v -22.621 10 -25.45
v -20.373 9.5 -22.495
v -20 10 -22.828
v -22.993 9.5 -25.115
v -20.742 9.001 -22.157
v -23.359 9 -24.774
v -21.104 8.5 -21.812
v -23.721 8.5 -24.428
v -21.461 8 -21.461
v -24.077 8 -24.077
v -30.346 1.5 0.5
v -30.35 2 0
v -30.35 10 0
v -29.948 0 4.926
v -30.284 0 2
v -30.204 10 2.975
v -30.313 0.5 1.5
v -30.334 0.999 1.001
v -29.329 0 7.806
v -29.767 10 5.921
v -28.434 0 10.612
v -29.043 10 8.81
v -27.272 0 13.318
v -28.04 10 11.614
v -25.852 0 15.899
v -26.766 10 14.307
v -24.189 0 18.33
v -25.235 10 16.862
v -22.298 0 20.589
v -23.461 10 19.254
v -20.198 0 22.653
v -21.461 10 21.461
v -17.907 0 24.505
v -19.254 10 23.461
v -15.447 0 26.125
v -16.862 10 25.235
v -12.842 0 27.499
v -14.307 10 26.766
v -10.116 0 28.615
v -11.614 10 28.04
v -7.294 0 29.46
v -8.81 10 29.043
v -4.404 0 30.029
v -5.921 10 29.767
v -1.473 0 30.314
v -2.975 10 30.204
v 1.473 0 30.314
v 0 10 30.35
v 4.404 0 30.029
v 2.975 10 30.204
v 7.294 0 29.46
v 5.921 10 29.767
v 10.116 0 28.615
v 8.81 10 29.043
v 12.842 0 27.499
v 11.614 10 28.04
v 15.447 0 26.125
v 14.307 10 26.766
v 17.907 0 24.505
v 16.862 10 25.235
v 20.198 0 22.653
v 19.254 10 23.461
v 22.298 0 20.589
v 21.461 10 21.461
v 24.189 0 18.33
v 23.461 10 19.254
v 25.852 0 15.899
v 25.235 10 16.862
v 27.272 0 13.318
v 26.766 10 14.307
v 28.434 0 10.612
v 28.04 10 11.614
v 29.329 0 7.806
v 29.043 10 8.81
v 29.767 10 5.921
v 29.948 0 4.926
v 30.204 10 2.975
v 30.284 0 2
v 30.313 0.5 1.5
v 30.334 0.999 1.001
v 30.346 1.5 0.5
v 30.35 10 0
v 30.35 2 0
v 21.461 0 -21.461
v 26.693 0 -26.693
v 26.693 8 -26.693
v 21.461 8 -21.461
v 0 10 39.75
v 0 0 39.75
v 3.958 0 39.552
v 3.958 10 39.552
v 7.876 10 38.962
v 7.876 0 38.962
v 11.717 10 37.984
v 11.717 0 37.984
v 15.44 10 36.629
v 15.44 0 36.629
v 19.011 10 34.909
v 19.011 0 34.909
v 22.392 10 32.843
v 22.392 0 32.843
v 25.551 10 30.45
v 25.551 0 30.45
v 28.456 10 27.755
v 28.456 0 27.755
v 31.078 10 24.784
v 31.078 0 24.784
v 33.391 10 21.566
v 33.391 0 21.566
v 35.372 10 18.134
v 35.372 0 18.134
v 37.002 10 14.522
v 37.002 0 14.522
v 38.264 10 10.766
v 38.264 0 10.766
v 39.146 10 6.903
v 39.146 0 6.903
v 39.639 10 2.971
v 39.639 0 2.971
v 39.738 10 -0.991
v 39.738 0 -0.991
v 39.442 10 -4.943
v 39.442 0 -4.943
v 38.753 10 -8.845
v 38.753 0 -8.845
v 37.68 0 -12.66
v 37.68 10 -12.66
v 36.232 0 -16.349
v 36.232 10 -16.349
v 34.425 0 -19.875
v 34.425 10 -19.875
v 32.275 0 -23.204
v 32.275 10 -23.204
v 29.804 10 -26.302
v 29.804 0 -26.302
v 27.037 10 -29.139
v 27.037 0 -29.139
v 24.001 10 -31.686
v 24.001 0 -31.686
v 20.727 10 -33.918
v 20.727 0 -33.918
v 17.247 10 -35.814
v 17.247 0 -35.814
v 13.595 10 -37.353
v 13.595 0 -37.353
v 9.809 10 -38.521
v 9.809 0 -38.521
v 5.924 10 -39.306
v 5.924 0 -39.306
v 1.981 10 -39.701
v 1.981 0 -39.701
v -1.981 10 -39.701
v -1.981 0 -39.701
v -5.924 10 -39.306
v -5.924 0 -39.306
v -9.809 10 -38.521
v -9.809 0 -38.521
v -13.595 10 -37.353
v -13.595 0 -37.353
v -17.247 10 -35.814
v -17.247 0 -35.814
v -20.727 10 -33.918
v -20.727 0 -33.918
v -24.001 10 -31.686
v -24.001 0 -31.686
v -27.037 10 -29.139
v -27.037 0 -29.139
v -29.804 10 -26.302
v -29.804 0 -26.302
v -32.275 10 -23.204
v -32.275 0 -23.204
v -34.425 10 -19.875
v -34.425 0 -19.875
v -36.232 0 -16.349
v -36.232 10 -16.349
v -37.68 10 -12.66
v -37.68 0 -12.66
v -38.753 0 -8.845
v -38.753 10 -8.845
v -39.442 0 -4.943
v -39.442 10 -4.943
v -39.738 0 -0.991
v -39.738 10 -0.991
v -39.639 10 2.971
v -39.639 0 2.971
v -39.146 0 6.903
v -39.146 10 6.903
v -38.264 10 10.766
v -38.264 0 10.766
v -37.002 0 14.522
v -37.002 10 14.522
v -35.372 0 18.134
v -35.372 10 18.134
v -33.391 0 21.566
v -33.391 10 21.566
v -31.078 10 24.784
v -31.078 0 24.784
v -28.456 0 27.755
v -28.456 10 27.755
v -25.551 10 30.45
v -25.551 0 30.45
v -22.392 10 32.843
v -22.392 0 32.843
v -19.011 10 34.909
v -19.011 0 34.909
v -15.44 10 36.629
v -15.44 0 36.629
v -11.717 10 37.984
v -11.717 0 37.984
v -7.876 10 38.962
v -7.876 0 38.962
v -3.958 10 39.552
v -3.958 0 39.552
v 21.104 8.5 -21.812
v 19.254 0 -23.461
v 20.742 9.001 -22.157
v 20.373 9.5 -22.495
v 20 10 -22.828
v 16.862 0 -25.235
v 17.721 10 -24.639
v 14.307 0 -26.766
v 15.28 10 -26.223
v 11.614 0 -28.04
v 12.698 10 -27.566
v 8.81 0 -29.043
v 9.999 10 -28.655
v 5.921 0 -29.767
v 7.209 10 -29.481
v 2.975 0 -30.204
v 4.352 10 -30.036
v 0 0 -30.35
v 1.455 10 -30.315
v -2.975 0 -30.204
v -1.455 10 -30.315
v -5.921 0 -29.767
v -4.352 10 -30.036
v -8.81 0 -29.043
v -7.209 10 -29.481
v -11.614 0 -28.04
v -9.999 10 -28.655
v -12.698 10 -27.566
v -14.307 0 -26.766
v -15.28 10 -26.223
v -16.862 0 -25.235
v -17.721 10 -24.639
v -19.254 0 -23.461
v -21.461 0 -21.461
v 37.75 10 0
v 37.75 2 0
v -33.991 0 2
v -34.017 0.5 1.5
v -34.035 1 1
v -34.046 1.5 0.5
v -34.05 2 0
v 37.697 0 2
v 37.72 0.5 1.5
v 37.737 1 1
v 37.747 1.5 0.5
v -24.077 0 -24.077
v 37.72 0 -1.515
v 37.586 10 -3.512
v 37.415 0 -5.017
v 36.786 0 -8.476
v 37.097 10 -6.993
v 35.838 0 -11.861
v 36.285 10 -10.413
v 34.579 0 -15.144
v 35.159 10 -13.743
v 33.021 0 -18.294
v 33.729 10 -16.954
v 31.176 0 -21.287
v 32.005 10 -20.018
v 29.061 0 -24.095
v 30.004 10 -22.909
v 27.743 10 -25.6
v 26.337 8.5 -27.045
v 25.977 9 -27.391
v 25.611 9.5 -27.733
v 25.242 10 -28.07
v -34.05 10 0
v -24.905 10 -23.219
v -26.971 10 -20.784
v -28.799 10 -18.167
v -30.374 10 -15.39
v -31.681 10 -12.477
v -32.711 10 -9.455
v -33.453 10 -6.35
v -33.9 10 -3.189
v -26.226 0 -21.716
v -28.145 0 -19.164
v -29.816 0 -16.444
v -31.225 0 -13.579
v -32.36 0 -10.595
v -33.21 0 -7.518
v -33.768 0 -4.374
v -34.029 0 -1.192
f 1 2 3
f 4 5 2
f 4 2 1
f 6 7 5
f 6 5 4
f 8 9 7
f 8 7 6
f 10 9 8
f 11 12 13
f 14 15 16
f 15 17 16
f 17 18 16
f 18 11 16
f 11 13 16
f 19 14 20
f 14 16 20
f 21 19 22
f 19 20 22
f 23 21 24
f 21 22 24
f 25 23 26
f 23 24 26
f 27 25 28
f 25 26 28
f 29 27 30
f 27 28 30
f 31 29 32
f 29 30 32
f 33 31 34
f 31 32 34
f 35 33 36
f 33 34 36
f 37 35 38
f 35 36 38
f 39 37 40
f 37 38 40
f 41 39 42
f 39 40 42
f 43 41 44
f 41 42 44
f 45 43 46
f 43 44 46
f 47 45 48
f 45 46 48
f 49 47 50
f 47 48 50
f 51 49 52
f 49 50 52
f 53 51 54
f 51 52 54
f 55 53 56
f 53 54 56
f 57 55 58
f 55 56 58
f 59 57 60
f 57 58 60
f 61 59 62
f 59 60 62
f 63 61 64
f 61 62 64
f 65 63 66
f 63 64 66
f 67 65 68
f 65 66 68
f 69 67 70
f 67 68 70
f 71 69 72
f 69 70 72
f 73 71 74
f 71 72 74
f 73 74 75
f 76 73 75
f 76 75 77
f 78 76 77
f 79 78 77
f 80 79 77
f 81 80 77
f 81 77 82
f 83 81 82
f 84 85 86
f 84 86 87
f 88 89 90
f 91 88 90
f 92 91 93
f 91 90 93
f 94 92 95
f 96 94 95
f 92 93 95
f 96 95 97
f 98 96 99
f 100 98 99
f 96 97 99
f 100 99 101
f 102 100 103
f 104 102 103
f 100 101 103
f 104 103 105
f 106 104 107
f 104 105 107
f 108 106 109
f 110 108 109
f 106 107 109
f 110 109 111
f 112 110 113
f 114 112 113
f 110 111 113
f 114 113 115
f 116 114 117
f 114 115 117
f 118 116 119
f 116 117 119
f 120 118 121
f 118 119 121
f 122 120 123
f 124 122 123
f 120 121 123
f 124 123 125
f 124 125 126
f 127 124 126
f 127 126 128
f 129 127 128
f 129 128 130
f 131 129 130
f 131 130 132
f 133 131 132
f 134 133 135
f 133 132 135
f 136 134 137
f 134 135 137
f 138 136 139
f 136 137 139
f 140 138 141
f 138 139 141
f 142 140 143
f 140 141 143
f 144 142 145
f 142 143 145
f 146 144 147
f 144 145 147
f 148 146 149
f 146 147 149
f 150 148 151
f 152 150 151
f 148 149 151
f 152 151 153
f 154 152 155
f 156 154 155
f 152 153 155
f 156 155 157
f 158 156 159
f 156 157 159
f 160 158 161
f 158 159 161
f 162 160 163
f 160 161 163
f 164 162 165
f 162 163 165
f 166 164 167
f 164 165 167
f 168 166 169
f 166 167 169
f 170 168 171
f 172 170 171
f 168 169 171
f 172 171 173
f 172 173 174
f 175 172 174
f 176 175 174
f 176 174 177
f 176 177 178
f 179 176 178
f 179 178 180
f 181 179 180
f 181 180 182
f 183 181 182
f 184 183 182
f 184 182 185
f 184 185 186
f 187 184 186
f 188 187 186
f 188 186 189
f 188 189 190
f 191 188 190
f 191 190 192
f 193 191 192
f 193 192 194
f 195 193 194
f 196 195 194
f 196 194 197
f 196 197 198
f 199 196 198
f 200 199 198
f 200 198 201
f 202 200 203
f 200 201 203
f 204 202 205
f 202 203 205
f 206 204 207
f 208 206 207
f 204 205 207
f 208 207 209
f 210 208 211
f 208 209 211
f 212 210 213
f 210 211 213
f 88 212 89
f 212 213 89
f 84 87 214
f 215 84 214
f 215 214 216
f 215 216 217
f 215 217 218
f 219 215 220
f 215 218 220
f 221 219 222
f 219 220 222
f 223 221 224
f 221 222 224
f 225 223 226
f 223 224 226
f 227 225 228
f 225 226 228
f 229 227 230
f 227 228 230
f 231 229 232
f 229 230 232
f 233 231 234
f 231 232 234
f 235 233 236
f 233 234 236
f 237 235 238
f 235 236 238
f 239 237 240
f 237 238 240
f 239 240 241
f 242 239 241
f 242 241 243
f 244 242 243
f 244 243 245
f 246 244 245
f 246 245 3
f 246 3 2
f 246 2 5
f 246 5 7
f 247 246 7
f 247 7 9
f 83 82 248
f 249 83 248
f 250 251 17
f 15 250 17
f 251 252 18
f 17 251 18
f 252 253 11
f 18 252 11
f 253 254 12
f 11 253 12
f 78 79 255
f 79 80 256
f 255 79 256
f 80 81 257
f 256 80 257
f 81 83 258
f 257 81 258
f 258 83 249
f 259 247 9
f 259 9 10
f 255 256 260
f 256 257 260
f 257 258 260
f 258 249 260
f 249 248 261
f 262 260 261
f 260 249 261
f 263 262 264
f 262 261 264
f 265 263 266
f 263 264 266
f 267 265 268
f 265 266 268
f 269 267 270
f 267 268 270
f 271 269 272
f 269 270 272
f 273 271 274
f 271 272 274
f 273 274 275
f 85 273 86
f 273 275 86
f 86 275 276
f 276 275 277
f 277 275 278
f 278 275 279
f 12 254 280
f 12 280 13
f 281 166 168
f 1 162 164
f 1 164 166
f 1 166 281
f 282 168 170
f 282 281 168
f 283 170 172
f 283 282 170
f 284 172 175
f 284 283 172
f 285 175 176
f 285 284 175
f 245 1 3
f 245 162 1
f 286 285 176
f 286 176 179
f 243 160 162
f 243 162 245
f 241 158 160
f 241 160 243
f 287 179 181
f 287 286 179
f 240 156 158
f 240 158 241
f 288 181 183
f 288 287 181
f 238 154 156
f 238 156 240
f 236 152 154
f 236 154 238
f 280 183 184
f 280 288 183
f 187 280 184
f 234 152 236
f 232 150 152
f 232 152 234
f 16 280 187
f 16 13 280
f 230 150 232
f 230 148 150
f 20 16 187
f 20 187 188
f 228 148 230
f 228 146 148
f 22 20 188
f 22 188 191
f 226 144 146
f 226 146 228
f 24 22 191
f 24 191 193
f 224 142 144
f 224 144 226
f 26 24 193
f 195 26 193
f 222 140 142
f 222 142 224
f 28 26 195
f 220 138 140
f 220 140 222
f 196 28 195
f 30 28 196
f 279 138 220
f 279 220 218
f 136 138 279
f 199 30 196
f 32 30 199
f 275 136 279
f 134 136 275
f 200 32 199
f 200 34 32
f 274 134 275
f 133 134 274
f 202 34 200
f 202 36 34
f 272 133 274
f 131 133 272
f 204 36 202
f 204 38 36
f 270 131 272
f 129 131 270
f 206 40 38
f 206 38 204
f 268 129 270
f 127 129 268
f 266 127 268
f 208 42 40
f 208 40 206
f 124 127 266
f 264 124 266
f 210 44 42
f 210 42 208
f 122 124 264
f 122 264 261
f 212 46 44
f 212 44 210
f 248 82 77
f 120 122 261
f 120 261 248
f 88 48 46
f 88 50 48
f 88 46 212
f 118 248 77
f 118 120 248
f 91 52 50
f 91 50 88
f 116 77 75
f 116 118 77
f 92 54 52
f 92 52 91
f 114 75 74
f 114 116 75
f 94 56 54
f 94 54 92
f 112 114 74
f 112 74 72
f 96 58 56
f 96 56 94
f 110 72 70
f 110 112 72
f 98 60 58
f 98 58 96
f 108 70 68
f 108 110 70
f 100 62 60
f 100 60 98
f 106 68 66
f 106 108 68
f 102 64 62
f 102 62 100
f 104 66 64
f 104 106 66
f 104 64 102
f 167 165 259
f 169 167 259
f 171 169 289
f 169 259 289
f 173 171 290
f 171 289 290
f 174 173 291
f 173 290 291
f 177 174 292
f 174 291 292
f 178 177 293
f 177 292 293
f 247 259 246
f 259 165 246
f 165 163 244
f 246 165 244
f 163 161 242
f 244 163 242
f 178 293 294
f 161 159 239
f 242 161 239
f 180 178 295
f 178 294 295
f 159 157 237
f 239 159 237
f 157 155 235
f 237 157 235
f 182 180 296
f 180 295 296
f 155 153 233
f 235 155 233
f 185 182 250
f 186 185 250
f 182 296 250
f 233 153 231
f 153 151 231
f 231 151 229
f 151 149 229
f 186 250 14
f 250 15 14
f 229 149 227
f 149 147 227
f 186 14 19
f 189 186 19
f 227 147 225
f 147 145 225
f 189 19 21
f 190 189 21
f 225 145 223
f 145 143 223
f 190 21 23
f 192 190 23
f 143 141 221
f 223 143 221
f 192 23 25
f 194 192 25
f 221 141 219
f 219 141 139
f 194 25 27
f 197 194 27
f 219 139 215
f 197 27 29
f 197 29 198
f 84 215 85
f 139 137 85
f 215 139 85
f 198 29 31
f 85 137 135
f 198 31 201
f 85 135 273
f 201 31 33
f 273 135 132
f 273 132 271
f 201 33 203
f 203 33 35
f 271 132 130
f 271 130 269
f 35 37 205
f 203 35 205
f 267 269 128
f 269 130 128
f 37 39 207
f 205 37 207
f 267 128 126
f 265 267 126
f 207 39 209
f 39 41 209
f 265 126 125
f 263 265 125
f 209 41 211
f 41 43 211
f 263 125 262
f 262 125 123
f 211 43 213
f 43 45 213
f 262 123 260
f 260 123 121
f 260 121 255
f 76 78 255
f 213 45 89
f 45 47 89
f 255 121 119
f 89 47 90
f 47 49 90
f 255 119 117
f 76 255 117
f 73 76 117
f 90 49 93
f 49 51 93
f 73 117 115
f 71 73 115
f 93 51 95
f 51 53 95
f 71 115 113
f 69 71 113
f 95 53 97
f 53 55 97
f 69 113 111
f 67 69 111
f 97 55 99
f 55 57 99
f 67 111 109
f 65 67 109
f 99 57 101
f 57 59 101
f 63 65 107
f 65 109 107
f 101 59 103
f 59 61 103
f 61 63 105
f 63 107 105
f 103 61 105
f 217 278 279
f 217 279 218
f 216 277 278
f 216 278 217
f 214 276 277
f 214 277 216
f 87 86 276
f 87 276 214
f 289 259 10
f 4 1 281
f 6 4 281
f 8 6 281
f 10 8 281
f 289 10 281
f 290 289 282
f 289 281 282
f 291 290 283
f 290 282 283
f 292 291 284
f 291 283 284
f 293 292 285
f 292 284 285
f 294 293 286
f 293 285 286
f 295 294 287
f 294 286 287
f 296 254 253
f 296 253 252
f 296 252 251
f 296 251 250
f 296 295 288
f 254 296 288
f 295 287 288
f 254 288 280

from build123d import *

# Parameters (mm, degrees)
SKETCH1_R           = 39.75
BOSS_EXTRUDE1_DEPTH = 10
CUT_EXTRUDE4_DEPTH  = 10
CHAMFER1_SIZE       = 2
CHAMFER2_SIZE       = 2
CHAMFER3_SIZE       = 2
CHAMFER4_SIZE       = 2


with BuildPart() as part:
    # Sketch1 → Boss-Extrude1 (new body)
    with BuildSketch(Plane(origin=(0, 0, 0), x_dir=(1, 0, 0), z_dir=(0, 1, 0))):
        with Locations(Location((0, 0, 0), (0, 0, 270))):
            Circle(SKETCH1_R)
    extrude(amount=BOSS_EXTRUDE1_DEPTH)

    # Sketch2 → Cut-Extrude4 (cut)
    with BuildSketch(Plane(origin=(0, 10, 0), x_dir=(1, 0, 0), z_dir=(0, 1, 0))):
        with BuildLine():
            Line((30.35, 0), (37.75, 0))
            ThreePointArc((37.75, 0), (34.876452352, 14.446299572), (26.69328099, 26.69328099))
            Line((26.69328099, 26.69328099), (21.460690809, 21.460690809))
            ThreePointArc((21.460690809, 21.460690809), (0, 30.35), (-21.460690809, 21.460690809))
            Line((-21.460690809, 21.460690809), (-24.076985899, 24.076985899))
            ThreePointArc((-24.076985899, 24.076985899), (-31.458098082, 13.030370872), (-34.05, 0))
            Line((-34.05, 0), (-30.35, 0))
            ThreePointArc((-30.35, 0), (0, -30.35), (30.35, 0))
        make_face()
    extrude(amount=-CUT_EXTRUDE4_DEPTH, mode=Mode.SUBTRACT)

    # Chamfer1
    chamfer1_edges = [part.edges().sort_by_distance(p)[0] for p in [
        (34.05, 0, 0),
    ]]
    chamfer(chamfer1_edges, length=CHAMFER1_SIZE)

    # Chamfer2
    chamfer2_edges = [part.edges().sort_by_distance(p)[0] for p in [
        (-32.2, 0, 0),
    ]]
    chamfer(chamfer2_edges, length=CHAMFER2_SIZE)

    # Chamfer3
    chamfer3_edges = [part.edges().sort_by_distance(p)[0] for p in [
        (24.076985899, 10, -24.076985899),
    ]]
    chamfer(chamfer3_edges, length=CHAMFER3_SIZE)

    # Chamfer4
    chamfer4_edges = [part.edges().sort_by_distance(p)[0] for p in [
        (-22.768838354, 10, -22.768838354),
    ]]
    chamfer(chamfer4_edges, length=CHAMFER4_SIZE)


solid = part.part
